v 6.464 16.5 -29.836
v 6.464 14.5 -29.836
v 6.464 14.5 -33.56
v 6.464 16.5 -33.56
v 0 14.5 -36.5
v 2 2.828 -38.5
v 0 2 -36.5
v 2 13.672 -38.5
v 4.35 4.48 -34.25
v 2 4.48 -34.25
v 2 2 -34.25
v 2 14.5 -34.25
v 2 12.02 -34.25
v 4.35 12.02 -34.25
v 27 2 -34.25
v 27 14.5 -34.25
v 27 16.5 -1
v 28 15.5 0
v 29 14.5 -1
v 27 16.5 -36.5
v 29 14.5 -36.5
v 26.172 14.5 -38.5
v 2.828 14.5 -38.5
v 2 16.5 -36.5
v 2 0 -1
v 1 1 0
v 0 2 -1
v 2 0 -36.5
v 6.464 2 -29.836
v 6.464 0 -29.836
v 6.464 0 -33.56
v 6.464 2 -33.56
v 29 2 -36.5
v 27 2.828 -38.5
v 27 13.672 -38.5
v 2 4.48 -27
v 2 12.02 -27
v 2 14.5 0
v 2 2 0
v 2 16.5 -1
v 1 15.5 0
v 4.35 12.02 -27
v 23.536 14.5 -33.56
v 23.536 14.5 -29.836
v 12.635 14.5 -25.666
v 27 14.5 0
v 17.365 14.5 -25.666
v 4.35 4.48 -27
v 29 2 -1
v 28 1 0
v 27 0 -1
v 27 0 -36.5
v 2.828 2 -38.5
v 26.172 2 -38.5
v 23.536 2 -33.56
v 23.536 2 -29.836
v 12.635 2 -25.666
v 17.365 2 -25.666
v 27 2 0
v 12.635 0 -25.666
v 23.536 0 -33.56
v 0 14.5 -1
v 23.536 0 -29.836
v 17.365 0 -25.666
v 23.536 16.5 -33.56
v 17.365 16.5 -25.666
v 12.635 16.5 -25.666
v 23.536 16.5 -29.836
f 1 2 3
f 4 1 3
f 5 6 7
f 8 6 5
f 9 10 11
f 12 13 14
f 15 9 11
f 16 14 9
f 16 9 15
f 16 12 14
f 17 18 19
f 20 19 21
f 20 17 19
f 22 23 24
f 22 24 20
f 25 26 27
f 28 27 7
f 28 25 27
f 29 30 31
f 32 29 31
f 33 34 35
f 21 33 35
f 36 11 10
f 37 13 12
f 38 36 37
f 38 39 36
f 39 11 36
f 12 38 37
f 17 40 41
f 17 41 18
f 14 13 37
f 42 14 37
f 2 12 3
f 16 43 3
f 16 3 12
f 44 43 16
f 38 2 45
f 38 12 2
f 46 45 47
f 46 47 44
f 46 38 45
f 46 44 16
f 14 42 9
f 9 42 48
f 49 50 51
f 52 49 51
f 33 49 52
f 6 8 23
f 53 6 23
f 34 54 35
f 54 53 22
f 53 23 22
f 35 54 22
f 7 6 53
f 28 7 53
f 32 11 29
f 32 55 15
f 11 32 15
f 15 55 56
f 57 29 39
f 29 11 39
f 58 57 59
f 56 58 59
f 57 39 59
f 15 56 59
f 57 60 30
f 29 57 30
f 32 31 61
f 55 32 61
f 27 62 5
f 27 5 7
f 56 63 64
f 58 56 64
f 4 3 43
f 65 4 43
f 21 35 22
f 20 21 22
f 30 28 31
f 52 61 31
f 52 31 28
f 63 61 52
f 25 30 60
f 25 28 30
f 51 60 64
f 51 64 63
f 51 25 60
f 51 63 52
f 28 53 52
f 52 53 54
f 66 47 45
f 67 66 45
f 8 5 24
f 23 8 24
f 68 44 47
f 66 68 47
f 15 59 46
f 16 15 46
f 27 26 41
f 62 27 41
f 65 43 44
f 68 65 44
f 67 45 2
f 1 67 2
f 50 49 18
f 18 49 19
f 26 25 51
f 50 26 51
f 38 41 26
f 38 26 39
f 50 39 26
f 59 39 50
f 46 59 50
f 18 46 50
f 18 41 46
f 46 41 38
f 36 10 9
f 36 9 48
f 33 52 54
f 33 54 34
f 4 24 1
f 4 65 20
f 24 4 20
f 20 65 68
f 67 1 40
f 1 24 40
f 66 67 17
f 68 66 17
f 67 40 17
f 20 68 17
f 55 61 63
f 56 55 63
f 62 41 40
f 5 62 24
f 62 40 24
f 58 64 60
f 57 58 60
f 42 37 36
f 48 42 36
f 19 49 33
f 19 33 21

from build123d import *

# Parameters (mm, degrees)
F0_W      = 29
F0_H      = 16.5
F1_DEPTH  = 38.5
F2_T      = -2
F3_DEPTH  = 2.25
F4_SIZE   = 2
F5_SIZE   = 2
F6_SIZE   = 0.99999
F8_DEPTH  = 16.501
F9_W      = 7.54
F9_H      = 7.25
F9_R      = 1.1
F10_DEPTH = 4.35


# Not quite as in the source:
# - a fillet or chamfer is up to 0.001 mm smaller than in the source, because OpenCascade refuses the exact size


with BuildPart() as f1:
    # F0 (on Top) → F1 (new body)
    with BuildSketch(Plane.XY):
        with Locations((14.5, 8.25)):
            Rectangle(F0_W, F0_H)
    extrude(amount=-F1_DEPTH)

    # F2
    f2_openings = [f1.faces().sort_by_distance(p)[0] for p in [
        (14.5, 8.25, 0),
    ]]
    offset(amount=F2_T, openings=f2_openings)

    # F3 (add): a face of the model
    f3_faces = [f1.faces().sort_by_distance(p)[0] for p in [
        (14.5, 8.25, -36.5),
    ]]
    extrude(f3_faces, amount=F3_DEPTH)

    # F4
    f4_edges = [f1.edges().sort_by_distance(p)[0] for p in [
        (29, 0, -19.25),
        (0, 0, -19.25),
        (0, 16.5, -19.25),
        (29, 16.5, -19.25),
    ]]
    chamfer(f4_edges, length=F4_SIZE)

    # F5
    f5_edges = [f1.edges().sort_by_distance(p)[0] for p in [
        (0, 8.25, -38.5),
        (1, 15.5, -38.5),
        (1, 1, -38.5),
        (14.5, 16.5, -38.5),
        (14.5, 0, -38.5),
        (28, 15.5, -38.5),
        (28, 1, -38.5),
        (29, 8.25, -38.5),
    ]]
    chamfer(f5_edges, length=F5_SIZE)

    # F6 (size 1 in the source; OpenCascade refuses exactly that, so slightly less here)
    f6_edges = [f1.edges().sort_by_distance(p)[0] for p in [
        (0, 8.25, 0),
        (14.5, 16.5, 0),
        (29, 8.25, 0),
        (14.5, 0, 0),
    ]]
    chamfer(f6_edges, length=F6_SIZE)

    # F7 (on face) → F8 (cut, through all)
    with BuildSketch(Plane.XZ):
        Polygon((23.536, -33.56), (23.536, -29.836), (17.365, -25.666), (12.635, -25.666), (6.464, -29.836), (6.464, -33.56), align=None)
    extrude(amount=-F8_DEPTH, mode=Mode.SUBTRACT)

    # F9 (on face) → F10 (join)
    with BuildSketch(Plane(origin=(0, 0, 0), x_dir=(0, -1, 0), z_dir=(-1, 0, 0))):
        with Locations((-8.25, -30.625)):
            Rectangle(F9_W, F9_H)
        with Locations((-8.25, -29.5)):
            Circle(F9_R, mode=Mode.SUBTRACT)
        with Locations((-8.25, -29.5)):
            Circle(F9_R)
    extrude(amount=-F10_DEPTH)


solid = f1.part
